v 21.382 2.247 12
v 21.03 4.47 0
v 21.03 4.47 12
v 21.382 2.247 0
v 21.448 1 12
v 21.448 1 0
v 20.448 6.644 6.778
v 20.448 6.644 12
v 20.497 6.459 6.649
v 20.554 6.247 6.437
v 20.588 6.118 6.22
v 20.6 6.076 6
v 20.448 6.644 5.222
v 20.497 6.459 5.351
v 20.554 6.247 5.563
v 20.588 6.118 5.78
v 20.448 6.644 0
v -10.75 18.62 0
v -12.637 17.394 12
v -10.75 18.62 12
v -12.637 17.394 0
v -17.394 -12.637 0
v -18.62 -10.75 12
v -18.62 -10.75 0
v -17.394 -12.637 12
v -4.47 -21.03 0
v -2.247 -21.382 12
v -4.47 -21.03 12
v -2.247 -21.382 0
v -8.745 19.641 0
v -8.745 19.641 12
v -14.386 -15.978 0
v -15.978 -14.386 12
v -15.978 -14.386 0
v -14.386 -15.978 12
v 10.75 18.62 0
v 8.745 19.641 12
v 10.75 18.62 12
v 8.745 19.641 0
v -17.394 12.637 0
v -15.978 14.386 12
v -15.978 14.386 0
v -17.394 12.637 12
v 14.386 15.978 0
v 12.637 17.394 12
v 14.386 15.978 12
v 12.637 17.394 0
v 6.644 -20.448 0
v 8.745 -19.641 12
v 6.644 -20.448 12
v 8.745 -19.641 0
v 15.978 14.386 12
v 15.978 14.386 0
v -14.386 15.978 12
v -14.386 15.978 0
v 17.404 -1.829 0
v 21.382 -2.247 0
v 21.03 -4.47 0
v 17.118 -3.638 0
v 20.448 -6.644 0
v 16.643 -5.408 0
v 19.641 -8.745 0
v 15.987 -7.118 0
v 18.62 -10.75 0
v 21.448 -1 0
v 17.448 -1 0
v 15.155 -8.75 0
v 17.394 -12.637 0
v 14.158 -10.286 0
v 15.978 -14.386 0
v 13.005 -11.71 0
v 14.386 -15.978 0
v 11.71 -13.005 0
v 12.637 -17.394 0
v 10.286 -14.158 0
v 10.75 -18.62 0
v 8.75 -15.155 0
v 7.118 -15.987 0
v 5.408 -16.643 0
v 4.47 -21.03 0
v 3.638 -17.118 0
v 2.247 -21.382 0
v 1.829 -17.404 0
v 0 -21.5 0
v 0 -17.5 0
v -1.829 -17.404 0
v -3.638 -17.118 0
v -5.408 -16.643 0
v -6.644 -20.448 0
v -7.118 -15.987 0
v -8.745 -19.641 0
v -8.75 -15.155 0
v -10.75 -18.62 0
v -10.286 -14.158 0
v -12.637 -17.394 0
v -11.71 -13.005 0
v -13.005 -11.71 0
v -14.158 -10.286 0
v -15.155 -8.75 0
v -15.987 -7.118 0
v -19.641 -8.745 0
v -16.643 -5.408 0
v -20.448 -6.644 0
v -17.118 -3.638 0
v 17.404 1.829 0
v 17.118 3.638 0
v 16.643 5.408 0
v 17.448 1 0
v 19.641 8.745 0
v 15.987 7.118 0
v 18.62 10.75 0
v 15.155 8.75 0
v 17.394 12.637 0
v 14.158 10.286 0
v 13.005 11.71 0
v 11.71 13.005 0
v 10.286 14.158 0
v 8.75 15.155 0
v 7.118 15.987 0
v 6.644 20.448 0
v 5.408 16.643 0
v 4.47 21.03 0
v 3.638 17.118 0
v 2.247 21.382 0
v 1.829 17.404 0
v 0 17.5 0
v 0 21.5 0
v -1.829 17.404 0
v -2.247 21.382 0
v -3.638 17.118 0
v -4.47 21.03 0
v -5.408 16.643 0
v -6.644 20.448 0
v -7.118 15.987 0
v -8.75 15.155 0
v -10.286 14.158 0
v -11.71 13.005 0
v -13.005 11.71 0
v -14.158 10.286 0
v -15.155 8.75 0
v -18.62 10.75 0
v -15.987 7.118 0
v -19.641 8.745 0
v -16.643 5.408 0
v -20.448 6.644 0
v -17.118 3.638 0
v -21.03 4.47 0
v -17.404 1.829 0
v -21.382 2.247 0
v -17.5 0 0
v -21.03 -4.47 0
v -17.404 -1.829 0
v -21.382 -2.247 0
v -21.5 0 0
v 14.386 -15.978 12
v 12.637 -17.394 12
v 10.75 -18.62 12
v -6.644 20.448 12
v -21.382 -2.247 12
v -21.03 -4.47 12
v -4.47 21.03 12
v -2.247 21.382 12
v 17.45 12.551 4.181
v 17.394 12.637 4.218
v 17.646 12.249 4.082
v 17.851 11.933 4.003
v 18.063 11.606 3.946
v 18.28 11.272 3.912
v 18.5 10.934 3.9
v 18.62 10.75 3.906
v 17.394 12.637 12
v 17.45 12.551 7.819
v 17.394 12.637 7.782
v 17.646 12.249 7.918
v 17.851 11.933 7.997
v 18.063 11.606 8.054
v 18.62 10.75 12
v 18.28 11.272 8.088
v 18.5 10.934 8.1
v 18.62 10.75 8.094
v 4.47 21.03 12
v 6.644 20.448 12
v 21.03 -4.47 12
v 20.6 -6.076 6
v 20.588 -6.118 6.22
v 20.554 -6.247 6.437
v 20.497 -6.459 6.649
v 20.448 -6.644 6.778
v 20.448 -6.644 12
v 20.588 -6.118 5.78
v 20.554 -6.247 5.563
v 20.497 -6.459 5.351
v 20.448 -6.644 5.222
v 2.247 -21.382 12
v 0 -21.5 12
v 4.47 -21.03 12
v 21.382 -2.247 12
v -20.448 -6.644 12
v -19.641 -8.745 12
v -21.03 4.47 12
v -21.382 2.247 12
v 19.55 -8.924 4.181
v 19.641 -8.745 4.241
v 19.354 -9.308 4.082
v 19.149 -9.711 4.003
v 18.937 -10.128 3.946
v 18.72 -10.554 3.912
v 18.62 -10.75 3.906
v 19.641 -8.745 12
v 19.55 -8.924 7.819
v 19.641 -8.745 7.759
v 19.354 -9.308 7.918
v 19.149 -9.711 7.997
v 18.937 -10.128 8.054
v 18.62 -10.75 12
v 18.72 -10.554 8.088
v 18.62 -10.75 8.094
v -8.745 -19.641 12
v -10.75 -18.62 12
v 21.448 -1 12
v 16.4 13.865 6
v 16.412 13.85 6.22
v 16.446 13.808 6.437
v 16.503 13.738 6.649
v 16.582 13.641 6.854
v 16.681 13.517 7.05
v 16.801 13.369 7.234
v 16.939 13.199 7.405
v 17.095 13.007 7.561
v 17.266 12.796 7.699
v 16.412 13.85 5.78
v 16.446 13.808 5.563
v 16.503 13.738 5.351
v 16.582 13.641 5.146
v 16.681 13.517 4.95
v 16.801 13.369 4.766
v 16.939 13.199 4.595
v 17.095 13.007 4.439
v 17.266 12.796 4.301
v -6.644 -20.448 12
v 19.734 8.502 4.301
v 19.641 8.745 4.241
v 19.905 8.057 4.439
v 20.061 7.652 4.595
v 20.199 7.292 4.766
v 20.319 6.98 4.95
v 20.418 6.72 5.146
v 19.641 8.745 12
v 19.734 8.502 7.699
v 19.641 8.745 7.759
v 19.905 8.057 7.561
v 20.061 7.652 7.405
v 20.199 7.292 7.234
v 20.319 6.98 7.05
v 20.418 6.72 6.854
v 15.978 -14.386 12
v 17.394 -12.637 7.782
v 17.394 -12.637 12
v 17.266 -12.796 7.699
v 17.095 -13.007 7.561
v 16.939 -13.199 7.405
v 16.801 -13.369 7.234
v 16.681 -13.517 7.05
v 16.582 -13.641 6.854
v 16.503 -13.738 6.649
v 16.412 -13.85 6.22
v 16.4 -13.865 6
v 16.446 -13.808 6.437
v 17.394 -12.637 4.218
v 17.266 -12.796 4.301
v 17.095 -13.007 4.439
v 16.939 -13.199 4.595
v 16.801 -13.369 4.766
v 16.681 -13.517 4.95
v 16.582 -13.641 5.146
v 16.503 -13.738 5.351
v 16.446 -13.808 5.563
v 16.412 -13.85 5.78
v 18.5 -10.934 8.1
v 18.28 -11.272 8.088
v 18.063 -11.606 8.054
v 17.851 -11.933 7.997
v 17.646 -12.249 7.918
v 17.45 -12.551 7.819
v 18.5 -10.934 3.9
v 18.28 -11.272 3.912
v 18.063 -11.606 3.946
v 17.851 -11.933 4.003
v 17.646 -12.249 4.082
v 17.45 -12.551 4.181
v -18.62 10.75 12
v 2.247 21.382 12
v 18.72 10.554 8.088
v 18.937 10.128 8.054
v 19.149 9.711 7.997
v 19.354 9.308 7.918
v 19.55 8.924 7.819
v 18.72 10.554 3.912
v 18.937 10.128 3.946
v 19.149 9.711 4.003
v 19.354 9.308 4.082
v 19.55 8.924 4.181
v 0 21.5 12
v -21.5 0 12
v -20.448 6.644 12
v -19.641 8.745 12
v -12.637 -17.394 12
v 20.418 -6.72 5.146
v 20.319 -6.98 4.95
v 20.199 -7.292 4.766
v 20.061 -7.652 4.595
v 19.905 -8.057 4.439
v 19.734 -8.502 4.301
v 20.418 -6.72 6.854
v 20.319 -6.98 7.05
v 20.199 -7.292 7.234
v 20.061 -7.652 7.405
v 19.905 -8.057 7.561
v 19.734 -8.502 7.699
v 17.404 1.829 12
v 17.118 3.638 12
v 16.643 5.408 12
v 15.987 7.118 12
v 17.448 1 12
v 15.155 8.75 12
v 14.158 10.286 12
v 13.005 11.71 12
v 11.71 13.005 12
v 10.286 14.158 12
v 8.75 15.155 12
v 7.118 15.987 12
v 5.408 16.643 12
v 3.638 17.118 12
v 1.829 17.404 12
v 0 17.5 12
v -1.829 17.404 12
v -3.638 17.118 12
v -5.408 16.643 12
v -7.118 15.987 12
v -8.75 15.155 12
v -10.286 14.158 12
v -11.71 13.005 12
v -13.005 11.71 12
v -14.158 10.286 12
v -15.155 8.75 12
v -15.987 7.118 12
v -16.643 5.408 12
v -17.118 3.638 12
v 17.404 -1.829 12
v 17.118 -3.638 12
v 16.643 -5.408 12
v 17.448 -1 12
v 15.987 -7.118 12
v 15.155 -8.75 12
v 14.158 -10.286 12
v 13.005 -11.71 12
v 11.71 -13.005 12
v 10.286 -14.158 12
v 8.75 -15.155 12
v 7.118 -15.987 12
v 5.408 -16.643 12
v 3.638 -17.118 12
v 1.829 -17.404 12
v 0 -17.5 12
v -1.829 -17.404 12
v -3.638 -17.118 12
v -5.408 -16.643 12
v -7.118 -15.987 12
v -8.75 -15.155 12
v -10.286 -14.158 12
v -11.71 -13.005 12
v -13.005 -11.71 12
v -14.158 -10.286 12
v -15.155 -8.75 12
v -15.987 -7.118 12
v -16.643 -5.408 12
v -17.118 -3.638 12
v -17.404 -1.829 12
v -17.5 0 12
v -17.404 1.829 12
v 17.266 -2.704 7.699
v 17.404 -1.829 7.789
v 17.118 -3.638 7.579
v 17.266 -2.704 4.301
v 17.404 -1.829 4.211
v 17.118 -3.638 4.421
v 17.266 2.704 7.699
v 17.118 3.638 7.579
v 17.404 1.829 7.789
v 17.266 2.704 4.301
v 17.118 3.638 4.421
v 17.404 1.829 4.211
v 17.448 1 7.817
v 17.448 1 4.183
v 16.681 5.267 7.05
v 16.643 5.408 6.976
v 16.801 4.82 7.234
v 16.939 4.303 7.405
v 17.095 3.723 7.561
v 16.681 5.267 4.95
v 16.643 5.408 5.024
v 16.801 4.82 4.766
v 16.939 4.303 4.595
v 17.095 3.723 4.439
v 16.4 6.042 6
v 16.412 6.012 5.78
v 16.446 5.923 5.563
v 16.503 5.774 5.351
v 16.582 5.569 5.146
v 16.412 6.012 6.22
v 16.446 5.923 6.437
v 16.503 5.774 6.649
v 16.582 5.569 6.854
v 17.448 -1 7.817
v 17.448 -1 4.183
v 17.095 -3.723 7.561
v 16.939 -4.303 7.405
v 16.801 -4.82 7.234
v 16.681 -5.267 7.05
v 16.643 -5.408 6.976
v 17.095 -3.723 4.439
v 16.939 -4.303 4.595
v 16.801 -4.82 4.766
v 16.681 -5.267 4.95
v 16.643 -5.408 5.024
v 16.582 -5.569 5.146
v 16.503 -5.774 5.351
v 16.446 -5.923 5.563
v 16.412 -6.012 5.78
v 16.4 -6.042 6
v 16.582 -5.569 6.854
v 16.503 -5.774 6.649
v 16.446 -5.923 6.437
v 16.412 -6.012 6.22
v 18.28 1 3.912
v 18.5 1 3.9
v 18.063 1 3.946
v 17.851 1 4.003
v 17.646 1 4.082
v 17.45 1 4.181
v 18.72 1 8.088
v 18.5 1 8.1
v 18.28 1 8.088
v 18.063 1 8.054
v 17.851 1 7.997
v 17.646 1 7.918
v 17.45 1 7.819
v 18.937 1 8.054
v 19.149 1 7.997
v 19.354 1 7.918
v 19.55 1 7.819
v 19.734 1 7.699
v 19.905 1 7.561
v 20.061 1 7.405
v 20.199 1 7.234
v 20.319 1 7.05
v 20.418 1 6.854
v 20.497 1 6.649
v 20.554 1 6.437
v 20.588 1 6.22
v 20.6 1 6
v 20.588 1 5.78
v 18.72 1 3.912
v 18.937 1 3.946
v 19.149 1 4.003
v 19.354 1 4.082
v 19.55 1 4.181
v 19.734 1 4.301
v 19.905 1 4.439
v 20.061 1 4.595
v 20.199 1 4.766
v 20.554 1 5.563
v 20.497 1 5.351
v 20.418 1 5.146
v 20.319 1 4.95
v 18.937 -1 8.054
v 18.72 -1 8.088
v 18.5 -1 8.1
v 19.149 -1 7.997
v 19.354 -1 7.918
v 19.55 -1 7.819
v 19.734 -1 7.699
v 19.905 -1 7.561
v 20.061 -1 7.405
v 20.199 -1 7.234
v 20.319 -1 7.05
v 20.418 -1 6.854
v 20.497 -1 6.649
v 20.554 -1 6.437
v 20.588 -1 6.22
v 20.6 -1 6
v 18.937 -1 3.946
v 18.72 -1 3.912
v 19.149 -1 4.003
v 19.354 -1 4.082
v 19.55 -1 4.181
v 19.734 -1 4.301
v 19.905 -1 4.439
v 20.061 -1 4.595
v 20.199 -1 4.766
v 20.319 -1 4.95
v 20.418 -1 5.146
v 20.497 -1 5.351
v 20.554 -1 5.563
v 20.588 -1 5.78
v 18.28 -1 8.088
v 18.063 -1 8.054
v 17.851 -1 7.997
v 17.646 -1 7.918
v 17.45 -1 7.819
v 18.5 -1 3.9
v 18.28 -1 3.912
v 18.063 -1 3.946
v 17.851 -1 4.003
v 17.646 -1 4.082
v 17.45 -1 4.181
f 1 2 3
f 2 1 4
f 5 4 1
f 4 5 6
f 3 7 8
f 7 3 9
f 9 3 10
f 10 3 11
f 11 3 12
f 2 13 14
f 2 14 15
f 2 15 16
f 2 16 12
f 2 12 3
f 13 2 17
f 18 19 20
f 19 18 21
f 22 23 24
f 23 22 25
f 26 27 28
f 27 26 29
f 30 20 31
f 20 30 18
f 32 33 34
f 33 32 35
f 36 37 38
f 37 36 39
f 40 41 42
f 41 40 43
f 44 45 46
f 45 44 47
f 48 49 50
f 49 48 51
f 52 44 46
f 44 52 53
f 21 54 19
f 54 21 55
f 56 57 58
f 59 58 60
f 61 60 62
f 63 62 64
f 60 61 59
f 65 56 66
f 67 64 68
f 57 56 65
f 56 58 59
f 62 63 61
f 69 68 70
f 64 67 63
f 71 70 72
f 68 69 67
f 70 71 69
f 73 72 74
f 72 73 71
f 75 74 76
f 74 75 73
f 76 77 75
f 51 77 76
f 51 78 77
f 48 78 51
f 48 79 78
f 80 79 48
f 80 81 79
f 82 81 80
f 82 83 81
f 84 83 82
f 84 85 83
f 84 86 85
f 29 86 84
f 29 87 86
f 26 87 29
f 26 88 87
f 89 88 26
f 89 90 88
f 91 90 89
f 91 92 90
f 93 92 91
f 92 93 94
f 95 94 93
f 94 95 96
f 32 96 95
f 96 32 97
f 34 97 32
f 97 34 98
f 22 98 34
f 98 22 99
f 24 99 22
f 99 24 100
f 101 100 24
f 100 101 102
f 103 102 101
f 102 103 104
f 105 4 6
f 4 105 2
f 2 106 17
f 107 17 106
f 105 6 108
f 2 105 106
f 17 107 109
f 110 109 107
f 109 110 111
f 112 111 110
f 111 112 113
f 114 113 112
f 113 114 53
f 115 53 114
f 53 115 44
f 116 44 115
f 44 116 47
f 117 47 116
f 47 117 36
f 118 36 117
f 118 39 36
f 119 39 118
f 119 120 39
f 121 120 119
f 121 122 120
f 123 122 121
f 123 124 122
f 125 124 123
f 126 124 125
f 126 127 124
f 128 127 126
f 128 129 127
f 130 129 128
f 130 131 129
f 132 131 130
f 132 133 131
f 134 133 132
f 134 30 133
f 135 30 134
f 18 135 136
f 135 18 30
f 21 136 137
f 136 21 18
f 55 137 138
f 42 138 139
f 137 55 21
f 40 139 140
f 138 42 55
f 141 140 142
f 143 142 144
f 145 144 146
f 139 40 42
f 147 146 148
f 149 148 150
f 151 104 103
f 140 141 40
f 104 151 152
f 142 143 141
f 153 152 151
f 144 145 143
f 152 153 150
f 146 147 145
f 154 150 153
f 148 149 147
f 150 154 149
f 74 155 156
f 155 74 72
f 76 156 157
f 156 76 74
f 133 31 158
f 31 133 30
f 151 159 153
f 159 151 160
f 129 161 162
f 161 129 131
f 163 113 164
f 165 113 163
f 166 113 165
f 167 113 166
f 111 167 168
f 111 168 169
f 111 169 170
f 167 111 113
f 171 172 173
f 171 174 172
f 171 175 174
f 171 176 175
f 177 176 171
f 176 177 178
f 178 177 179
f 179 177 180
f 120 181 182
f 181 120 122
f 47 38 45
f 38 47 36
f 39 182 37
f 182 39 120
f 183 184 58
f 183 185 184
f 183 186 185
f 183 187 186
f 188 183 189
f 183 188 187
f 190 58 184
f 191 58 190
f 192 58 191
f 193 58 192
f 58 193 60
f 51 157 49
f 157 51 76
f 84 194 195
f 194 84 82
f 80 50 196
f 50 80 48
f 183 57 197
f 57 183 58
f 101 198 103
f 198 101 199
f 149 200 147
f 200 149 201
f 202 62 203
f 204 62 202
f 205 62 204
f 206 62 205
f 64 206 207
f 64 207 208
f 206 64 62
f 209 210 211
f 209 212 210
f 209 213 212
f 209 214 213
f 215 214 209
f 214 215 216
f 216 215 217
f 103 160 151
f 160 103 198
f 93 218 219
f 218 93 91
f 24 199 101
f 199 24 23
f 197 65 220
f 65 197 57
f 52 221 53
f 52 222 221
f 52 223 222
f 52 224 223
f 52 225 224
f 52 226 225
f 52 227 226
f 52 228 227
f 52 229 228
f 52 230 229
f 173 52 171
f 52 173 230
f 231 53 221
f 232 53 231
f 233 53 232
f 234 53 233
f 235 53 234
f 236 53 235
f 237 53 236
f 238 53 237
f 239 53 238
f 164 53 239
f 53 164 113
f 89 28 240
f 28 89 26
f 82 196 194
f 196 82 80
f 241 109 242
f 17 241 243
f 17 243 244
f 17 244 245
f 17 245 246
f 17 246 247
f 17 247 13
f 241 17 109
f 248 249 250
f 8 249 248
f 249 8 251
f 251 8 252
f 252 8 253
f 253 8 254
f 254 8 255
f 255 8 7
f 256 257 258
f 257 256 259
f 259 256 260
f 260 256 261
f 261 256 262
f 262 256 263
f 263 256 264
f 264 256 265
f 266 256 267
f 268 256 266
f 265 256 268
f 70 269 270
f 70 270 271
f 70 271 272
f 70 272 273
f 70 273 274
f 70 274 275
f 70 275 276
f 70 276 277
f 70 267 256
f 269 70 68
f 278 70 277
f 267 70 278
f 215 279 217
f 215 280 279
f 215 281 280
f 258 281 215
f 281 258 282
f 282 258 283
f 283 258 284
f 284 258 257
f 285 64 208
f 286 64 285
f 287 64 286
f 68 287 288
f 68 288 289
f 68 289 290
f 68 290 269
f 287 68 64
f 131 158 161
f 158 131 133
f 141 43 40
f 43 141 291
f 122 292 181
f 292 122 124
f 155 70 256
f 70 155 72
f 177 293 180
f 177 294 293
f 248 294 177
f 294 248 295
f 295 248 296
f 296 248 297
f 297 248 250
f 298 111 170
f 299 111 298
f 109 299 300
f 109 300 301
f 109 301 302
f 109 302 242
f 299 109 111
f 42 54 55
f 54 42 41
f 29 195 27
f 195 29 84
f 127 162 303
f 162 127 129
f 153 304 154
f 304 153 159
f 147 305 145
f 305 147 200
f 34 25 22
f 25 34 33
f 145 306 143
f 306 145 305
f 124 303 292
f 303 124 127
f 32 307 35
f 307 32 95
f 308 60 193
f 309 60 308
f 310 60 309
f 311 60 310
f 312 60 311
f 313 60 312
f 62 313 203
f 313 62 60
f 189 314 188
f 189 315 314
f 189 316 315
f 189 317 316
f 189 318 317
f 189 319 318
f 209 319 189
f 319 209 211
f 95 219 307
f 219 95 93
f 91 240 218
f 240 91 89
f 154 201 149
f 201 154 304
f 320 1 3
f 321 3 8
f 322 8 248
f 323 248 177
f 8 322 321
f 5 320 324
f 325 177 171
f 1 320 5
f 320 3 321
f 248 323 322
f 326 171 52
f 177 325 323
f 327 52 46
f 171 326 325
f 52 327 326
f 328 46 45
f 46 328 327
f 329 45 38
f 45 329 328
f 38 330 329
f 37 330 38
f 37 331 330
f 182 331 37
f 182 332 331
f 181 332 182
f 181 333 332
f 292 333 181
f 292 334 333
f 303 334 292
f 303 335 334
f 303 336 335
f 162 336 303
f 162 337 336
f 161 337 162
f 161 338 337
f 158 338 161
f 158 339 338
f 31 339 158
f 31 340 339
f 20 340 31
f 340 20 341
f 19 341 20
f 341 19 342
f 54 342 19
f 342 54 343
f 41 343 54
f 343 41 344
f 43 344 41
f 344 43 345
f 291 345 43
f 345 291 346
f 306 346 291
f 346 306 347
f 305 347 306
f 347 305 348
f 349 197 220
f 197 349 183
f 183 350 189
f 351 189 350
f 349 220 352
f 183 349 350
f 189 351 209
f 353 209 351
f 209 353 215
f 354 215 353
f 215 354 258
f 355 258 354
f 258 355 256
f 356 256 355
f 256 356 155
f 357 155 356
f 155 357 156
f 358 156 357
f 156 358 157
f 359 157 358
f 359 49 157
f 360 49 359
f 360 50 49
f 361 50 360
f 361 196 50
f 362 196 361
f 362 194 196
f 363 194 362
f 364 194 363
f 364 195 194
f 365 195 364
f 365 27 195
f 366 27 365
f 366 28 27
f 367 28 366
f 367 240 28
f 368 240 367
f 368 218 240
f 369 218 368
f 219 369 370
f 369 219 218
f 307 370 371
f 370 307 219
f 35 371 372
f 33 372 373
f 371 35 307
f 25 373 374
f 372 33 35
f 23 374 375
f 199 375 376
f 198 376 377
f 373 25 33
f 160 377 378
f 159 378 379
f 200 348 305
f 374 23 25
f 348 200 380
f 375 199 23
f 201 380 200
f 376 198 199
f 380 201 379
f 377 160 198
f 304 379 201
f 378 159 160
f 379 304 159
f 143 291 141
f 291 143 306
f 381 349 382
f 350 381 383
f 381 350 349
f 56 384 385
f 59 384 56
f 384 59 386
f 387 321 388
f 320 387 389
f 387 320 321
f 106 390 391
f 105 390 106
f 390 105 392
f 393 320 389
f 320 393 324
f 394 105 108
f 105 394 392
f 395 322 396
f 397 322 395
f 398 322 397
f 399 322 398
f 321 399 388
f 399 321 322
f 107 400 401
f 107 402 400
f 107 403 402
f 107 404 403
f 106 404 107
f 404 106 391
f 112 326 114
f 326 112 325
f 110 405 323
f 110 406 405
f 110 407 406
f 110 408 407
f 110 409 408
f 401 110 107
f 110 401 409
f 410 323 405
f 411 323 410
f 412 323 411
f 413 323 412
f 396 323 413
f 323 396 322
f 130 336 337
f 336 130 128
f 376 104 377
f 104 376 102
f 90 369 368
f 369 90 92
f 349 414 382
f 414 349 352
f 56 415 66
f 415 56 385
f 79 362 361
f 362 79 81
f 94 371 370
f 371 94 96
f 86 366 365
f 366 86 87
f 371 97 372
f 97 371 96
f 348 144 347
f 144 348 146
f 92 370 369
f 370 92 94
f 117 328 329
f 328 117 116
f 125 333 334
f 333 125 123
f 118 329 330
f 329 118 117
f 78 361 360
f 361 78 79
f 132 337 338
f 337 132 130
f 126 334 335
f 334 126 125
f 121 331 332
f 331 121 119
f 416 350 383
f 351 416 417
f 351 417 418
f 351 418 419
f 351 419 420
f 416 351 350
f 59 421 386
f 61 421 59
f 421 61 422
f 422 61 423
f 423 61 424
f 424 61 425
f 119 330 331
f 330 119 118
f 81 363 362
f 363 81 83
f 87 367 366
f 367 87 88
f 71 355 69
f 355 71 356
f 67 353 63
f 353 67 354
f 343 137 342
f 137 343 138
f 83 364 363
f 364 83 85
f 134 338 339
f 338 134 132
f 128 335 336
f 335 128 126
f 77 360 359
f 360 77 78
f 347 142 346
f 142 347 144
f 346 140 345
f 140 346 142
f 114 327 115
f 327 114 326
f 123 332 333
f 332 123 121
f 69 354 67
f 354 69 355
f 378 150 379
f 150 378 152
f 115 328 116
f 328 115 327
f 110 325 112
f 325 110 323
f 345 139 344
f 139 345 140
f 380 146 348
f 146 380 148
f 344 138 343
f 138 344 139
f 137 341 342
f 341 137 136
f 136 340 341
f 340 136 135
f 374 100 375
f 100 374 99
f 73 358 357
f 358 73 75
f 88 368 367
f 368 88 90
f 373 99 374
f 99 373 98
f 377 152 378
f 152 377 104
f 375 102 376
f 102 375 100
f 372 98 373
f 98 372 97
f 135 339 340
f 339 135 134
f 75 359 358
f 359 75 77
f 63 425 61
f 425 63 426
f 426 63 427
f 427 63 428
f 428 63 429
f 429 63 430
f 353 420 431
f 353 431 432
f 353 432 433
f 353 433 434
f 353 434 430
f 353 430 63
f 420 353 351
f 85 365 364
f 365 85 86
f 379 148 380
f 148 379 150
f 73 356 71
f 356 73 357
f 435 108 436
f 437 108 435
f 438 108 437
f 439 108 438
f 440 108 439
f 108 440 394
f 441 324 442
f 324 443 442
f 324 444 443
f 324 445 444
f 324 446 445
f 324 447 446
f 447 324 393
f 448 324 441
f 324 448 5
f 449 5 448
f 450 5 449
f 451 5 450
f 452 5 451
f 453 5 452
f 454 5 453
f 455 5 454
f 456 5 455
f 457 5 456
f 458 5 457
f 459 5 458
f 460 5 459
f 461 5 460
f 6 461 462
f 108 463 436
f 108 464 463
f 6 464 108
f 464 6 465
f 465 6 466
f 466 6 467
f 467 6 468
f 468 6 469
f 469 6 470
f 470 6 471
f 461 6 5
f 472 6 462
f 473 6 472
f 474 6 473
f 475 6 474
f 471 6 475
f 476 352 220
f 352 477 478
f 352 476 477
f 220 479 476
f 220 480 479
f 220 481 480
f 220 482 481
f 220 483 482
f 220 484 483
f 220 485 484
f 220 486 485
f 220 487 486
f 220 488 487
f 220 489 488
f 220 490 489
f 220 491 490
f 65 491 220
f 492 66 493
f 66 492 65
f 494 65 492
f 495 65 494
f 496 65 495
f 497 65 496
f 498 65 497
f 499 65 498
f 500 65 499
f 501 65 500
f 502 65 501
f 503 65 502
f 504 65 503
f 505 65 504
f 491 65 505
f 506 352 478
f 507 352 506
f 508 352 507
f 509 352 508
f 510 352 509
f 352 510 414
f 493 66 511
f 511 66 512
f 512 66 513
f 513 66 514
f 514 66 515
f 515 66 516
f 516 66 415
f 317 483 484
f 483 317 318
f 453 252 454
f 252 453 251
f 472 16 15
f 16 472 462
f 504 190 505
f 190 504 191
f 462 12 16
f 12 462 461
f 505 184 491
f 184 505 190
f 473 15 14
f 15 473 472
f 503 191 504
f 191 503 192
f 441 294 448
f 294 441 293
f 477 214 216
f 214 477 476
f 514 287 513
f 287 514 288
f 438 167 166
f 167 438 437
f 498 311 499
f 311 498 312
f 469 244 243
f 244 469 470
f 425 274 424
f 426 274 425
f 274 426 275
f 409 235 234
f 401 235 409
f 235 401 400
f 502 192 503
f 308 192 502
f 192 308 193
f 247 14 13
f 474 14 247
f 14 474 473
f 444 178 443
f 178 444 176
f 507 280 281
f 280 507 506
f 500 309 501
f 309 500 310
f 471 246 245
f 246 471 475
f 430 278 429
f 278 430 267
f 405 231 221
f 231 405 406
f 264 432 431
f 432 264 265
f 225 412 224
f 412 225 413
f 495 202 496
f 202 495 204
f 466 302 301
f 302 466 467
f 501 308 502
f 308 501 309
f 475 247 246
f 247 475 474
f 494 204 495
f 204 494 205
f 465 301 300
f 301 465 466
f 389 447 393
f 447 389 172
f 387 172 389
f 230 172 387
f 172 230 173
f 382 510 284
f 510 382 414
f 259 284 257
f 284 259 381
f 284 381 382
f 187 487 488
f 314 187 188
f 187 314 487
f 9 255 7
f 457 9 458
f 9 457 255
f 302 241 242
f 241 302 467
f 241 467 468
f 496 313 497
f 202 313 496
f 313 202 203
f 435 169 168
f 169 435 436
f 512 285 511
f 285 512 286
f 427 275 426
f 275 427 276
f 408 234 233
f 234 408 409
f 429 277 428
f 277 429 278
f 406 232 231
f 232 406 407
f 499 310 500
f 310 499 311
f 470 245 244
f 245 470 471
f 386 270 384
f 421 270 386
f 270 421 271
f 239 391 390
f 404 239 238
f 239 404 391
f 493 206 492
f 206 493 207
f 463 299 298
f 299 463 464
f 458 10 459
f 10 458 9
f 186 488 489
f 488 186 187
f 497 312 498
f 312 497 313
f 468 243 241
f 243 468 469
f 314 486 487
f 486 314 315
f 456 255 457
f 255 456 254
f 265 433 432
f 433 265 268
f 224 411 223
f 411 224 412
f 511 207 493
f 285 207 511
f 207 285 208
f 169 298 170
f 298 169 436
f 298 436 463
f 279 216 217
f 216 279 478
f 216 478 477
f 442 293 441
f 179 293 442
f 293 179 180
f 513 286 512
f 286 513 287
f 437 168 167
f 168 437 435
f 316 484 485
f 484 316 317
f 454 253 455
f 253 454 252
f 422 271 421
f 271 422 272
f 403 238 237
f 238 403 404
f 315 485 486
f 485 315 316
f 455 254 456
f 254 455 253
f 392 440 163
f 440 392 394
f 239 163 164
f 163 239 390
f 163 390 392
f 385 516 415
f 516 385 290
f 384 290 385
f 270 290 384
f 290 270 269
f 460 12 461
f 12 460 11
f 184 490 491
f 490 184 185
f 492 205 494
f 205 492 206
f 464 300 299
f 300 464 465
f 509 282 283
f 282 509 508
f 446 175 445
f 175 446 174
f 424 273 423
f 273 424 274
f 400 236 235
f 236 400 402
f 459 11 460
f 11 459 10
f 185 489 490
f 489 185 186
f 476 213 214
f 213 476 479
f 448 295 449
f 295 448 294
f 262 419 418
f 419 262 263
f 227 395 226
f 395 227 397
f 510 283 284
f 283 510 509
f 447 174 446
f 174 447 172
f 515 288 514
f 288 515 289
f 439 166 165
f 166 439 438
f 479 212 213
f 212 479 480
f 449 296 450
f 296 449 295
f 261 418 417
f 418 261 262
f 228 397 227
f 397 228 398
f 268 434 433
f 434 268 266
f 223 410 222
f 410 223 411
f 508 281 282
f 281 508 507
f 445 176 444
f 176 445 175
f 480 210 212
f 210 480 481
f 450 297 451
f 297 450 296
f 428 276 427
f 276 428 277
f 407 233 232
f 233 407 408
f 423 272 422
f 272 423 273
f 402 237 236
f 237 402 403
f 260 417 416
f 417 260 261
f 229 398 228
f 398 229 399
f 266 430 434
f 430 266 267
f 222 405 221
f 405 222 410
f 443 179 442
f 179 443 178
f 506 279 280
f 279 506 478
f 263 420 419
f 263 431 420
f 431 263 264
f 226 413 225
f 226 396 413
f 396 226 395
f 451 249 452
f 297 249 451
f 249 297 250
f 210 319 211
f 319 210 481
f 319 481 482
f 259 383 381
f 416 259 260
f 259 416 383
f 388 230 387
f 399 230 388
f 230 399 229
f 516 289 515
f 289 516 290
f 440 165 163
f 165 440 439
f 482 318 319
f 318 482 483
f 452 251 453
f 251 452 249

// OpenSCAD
// C-style pipe clamp.
$fn = 60;
eps = 0.02;
pipe_d = 35;
wall = 4;
outer_d = pipe_d+2*wall;
width = 12;
difference() {
    cylinder(d=outer_d,h=width);
    translate([0,0,-eps]) cylinder(d=pipe_d,h=width+2*eps);
    translate([0,-1,-eps]) cube([outer_d/2+eps,2,width+2*eps]);
    translate([outer_d/2-3,-outer_d/2-eps,width/2]) rotate([-90,0,0]) cylinder(d=4.2,h=outer_d+2*eps);
}
